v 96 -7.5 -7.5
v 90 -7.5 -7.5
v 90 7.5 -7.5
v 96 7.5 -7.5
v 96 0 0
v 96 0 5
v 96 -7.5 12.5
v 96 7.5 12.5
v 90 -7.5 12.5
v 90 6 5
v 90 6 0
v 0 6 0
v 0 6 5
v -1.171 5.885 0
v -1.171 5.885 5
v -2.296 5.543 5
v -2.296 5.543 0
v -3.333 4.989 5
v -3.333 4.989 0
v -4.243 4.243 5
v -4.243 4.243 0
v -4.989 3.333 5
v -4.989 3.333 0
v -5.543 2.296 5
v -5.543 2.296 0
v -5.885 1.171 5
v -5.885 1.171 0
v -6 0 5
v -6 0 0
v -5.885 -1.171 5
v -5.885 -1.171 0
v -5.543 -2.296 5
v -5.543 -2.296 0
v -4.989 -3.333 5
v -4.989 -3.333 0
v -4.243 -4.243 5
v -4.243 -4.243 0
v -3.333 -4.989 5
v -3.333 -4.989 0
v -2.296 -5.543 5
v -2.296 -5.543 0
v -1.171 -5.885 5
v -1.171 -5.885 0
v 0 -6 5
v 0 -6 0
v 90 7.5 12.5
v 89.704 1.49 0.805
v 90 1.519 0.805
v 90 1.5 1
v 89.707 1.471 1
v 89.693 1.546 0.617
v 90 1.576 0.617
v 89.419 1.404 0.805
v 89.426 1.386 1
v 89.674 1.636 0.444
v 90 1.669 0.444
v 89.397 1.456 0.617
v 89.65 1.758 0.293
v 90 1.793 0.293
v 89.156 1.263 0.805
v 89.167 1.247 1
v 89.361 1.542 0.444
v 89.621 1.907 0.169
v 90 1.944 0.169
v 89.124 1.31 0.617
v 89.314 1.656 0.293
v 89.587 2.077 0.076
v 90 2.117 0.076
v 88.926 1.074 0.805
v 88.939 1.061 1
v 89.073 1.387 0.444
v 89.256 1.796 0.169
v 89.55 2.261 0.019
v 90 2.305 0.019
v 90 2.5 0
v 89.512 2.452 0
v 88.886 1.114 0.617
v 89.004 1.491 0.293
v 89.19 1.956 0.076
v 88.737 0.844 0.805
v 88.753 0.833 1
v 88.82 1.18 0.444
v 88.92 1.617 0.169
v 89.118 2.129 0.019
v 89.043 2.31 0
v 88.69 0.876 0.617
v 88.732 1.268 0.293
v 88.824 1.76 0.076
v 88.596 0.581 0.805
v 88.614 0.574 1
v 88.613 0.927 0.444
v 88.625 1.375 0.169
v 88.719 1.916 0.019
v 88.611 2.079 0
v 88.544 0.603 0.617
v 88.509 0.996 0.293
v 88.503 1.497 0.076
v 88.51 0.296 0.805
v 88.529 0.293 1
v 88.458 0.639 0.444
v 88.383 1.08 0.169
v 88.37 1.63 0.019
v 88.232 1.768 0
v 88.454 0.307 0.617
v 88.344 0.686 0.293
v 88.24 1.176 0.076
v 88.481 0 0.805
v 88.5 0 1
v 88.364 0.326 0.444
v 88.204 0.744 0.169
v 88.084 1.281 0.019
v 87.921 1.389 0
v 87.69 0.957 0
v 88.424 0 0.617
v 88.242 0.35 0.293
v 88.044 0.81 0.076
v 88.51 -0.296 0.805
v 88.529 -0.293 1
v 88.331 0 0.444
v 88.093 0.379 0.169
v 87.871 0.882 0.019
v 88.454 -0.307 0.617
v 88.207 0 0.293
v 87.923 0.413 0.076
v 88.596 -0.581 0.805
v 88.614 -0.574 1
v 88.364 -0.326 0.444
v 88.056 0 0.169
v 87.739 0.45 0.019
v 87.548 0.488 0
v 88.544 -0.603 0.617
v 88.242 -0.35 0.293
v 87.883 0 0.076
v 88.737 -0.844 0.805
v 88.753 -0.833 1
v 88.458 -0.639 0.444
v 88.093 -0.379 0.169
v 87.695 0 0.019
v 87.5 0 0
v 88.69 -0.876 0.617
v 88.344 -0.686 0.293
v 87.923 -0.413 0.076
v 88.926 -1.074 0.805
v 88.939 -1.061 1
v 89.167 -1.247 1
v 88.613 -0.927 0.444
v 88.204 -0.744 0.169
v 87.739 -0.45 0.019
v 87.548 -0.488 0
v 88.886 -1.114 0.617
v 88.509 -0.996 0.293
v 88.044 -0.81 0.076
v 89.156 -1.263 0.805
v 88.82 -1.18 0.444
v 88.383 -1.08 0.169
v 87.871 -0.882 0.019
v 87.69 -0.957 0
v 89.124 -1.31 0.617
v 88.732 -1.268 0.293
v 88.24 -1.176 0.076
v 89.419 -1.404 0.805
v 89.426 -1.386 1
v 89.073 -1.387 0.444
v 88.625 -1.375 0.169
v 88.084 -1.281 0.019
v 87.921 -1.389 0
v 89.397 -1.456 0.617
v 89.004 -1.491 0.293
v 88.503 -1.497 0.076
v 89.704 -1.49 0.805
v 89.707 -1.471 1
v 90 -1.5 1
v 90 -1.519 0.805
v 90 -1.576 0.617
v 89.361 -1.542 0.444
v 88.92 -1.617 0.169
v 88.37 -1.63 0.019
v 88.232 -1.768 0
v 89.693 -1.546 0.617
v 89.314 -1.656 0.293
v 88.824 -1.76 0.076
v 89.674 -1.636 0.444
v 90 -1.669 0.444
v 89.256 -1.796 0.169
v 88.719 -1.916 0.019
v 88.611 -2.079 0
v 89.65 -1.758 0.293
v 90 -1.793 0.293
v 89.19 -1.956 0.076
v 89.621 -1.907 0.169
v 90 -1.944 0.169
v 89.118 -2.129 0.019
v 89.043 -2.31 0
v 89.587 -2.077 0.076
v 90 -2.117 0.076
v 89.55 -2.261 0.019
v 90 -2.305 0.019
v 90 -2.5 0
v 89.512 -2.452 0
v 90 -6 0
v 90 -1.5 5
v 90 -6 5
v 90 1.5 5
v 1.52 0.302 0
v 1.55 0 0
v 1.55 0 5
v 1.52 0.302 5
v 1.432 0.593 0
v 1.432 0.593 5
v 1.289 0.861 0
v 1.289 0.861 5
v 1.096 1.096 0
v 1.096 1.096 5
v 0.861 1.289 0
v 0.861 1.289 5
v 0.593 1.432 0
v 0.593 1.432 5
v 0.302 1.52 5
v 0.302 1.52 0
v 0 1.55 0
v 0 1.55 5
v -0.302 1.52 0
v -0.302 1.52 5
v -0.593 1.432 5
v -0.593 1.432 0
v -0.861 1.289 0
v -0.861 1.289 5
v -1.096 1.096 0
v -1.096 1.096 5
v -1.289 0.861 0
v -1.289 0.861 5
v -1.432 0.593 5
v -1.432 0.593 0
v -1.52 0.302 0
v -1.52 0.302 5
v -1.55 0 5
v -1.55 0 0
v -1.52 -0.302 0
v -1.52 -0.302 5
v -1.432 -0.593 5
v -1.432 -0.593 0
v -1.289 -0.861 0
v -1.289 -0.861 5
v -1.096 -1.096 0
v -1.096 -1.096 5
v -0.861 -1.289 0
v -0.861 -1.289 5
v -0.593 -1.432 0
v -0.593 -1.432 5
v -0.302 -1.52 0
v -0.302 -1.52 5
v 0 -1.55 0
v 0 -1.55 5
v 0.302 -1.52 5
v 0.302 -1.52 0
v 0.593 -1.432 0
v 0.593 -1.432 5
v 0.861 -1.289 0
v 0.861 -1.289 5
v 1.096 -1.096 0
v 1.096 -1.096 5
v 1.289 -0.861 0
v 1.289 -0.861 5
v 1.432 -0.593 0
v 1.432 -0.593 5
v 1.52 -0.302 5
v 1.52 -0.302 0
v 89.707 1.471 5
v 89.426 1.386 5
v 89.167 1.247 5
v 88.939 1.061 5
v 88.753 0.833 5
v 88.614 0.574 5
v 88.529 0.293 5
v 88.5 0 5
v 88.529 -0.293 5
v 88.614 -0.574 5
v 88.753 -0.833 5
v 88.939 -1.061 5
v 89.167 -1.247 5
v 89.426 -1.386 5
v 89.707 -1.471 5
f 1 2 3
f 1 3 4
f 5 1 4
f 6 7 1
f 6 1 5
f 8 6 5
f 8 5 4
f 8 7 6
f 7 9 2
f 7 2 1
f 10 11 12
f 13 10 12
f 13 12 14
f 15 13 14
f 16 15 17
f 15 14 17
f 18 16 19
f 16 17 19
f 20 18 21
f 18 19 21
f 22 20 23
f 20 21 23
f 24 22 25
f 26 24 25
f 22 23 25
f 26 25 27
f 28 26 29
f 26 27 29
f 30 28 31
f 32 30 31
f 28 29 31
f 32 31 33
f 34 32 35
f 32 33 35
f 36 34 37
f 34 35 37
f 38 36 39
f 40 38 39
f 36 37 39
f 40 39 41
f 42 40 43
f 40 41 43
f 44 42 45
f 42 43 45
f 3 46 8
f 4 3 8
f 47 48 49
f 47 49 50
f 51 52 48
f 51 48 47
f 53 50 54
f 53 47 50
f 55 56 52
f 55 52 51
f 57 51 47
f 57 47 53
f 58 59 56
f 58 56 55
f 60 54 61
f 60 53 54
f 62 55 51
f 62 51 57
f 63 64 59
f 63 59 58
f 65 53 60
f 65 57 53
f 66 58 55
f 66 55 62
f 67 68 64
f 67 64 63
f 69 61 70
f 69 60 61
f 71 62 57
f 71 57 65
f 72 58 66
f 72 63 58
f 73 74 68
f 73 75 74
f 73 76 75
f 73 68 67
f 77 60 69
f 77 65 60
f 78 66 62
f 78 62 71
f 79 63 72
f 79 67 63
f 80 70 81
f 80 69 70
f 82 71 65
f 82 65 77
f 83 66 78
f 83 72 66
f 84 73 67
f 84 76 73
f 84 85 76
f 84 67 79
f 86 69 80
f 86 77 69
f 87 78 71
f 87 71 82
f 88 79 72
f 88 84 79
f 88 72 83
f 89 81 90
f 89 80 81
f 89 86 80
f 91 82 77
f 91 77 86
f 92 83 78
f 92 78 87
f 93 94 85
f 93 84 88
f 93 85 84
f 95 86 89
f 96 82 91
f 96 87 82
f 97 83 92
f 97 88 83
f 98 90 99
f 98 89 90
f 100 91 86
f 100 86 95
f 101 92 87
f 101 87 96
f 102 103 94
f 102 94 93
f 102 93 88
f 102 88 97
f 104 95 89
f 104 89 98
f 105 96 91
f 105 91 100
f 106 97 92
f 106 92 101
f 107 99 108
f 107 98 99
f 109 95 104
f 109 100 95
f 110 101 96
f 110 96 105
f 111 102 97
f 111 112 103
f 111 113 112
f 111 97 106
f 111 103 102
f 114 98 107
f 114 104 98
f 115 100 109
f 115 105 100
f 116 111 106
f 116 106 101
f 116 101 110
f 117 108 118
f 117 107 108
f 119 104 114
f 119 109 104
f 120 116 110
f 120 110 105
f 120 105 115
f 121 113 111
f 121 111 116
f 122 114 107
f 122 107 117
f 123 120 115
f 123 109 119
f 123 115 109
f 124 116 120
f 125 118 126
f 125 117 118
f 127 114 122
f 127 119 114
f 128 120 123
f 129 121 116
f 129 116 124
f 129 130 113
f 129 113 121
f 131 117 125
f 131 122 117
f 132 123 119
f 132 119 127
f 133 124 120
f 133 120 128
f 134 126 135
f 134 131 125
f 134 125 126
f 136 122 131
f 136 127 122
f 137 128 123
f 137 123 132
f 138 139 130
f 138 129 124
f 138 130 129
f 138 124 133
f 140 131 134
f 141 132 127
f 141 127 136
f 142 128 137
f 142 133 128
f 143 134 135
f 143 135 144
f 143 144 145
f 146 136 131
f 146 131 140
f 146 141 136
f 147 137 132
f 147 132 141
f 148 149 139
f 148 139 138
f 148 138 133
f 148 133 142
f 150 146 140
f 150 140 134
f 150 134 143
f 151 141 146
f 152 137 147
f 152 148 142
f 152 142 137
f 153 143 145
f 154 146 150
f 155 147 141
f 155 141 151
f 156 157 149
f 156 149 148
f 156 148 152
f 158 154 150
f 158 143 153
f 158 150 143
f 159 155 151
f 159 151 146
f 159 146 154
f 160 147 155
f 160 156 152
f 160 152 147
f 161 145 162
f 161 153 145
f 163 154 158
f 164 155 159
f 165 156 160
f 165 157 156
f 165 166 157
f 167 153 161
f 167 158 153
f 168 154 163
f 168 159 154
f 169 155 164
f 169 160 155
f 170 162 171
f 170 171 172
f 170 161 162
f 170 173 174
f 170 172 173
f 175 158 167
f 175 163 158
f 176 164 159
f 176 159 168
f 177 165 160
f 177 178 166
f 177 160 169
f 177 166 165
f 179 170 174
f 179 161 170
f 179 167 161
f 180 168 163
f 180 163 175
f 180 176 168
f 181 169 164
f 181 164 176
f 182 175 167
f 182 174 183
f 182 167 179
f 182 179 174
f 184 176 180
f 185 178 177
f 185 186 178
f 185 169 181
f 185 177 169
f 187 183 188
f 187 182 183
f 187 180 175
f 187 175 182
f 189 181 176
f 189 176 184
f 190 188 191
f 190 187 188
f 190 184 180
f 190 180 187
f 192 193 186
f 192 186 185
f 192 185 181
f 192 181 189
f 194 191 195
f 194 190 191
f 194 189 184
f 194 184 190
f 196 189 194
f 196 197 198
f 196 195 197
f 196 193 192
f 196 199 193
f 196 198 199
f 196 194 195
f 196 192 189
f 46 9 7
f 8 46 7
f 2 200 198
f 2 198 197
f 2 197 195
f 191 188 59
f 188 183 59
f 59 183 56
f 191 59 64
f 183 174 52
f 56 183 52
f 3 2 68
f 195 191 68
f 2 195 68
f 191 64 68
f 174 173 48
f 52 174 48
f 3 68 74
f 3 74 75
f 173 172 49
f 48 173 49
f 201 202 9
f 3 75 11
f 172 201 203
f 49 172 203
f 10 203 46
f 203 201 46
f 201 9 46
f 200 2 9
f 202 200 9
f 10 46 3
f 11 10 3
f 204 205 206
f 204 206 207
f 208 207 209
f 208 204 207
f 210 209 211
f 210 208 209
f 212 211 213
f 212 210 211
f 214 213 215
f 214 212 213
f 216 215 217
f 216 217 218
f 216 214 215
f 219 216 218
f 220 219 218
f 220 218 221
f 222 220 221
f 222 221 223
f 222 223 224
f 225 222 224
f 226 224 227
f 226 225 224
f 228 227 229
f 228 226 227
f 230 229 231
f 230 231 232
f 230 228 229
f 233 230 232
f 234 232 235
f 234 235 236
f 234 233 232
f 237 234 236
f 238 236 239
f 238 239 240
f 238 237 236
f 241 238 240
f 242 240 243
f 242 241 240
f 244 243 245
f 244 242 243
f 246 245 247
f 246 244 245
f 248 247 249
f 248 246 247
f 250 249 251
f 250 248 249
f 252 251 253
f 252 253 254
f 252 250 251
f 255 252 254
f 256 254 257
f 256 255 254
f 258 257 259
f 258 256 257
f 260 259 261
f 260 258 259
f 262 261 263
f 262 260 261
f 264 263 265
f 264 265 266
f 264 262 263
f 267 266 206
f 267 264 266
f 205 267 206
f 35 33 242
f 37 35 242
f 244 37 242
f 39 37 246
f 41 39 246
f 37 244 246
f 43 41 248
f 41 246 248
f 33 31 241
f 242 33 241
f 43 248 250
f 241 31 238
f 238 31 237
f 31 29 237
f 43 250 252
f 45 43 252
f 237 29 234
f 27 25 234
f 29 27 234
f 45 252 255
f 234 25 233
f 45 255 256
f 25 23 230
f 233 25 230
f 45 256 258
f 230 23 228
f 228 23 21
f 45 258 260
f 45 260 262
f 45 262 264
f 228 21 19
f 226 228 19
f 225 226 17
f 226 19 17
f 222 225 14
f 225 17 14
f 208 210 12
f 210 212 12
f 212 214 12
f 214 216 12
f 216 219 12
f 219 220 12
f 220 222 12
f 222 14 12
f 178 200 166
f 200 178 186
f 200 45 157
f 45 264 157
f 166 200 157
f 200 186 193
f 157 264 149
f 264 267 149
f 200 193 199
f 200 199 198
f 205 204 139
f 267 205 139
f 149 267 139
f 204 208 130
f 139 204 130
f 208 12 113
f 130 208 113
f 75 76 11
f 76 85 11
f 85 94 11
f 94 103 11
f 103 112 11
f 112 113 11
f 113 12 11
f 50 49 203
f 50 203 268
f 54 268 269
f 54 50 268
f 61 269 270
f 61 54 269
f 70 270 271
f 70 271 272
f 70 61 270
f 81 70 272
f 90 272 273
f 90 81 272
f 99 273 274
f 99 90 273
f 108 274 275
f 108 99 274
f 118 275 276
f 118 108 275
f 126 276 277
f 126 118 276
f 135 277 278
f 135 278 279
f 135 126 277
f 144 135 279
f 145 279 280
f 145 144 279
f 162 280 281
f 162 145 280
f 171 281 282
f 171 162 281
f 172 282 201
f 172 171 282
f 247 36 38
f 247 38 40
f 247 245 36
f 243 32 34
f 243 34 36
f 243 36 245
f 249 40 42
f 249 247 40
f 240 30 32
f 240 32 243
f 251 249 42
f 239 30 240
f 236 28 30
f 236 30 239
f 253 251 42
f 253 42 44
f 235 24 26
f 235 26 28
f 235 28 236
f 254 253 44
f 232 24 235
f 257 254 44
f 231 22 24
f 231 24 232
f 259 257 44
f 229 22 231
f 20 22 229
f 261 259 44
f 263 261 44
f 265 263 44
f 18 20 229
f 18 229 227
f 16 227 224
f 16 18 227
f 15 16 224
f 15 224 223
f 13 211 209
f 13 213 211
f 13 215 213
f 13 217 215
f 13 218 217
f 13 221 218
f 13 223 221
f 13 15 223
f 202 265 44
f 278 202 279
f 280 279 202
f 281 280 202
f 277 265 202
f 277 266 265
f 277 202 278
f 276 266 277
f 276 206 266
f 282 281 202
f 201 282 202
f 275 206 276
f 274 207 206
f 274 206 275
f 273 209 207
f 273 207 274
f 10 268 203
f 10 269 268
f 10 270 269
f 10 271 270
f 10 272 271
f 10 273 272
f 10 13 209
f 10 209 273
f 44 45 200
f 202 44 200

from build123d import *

# Parameters (mm, degrees)
SKETCH1_R           = 1.55
SKETCH1_R_2         = 1.5
BOSS_EXTRUDE1_DEPTH = 5
FILLET3_R           = 1
BOSS_EXTRUDE2_START = 7.5
SKETCH4_W           = 6
SKETCH4_H           = 15
BOSS_EXTRUDE2_DEPTH = 20


with BuildPart() as part:
    # Sketch1 → Boss-Extrude1 (new body)
    with BuildSketch(Plane.XY):
        with BuildLine():
            ThreePointArc((0, 6), (-6, 0), (0, -6))
            Line((0, -6), (90, -6))
            ThreePointArc((90, -6), (96, 0), (90, 6))
            Line((90, 6), (0, 6))
        make_face()
        Circle(SKETCH1_R, mode=Mode.SUBTRACT)
        with Locations((90, 0)):
            Circle(SKETCH1_R_2, mode=Mode.SUBTRACT)
    extrude(amount=BOSS_EXTRUDE1_DEPTH)

    # Fillet3
    fillet3_edges = [part.edges().sort_by_distance(p)[0] for p in [
        (88.5, 0, 0),
    ]]
    fillet(fillet3_edges, radius=FILLET3_R)

    # Sketch4 → Boss-Extrude2 (add)
    with BuildSketch(Plane.XY.offset(5).offset(BOSS_EXTRUDE2_START)):
        with Locations((93, 0)):
            Rectangle(SKETCH4_W, SKETCH4_H)
    extrude(amount=-BOSS_EXTRUDE2_DEPTH)


solid = part.part
